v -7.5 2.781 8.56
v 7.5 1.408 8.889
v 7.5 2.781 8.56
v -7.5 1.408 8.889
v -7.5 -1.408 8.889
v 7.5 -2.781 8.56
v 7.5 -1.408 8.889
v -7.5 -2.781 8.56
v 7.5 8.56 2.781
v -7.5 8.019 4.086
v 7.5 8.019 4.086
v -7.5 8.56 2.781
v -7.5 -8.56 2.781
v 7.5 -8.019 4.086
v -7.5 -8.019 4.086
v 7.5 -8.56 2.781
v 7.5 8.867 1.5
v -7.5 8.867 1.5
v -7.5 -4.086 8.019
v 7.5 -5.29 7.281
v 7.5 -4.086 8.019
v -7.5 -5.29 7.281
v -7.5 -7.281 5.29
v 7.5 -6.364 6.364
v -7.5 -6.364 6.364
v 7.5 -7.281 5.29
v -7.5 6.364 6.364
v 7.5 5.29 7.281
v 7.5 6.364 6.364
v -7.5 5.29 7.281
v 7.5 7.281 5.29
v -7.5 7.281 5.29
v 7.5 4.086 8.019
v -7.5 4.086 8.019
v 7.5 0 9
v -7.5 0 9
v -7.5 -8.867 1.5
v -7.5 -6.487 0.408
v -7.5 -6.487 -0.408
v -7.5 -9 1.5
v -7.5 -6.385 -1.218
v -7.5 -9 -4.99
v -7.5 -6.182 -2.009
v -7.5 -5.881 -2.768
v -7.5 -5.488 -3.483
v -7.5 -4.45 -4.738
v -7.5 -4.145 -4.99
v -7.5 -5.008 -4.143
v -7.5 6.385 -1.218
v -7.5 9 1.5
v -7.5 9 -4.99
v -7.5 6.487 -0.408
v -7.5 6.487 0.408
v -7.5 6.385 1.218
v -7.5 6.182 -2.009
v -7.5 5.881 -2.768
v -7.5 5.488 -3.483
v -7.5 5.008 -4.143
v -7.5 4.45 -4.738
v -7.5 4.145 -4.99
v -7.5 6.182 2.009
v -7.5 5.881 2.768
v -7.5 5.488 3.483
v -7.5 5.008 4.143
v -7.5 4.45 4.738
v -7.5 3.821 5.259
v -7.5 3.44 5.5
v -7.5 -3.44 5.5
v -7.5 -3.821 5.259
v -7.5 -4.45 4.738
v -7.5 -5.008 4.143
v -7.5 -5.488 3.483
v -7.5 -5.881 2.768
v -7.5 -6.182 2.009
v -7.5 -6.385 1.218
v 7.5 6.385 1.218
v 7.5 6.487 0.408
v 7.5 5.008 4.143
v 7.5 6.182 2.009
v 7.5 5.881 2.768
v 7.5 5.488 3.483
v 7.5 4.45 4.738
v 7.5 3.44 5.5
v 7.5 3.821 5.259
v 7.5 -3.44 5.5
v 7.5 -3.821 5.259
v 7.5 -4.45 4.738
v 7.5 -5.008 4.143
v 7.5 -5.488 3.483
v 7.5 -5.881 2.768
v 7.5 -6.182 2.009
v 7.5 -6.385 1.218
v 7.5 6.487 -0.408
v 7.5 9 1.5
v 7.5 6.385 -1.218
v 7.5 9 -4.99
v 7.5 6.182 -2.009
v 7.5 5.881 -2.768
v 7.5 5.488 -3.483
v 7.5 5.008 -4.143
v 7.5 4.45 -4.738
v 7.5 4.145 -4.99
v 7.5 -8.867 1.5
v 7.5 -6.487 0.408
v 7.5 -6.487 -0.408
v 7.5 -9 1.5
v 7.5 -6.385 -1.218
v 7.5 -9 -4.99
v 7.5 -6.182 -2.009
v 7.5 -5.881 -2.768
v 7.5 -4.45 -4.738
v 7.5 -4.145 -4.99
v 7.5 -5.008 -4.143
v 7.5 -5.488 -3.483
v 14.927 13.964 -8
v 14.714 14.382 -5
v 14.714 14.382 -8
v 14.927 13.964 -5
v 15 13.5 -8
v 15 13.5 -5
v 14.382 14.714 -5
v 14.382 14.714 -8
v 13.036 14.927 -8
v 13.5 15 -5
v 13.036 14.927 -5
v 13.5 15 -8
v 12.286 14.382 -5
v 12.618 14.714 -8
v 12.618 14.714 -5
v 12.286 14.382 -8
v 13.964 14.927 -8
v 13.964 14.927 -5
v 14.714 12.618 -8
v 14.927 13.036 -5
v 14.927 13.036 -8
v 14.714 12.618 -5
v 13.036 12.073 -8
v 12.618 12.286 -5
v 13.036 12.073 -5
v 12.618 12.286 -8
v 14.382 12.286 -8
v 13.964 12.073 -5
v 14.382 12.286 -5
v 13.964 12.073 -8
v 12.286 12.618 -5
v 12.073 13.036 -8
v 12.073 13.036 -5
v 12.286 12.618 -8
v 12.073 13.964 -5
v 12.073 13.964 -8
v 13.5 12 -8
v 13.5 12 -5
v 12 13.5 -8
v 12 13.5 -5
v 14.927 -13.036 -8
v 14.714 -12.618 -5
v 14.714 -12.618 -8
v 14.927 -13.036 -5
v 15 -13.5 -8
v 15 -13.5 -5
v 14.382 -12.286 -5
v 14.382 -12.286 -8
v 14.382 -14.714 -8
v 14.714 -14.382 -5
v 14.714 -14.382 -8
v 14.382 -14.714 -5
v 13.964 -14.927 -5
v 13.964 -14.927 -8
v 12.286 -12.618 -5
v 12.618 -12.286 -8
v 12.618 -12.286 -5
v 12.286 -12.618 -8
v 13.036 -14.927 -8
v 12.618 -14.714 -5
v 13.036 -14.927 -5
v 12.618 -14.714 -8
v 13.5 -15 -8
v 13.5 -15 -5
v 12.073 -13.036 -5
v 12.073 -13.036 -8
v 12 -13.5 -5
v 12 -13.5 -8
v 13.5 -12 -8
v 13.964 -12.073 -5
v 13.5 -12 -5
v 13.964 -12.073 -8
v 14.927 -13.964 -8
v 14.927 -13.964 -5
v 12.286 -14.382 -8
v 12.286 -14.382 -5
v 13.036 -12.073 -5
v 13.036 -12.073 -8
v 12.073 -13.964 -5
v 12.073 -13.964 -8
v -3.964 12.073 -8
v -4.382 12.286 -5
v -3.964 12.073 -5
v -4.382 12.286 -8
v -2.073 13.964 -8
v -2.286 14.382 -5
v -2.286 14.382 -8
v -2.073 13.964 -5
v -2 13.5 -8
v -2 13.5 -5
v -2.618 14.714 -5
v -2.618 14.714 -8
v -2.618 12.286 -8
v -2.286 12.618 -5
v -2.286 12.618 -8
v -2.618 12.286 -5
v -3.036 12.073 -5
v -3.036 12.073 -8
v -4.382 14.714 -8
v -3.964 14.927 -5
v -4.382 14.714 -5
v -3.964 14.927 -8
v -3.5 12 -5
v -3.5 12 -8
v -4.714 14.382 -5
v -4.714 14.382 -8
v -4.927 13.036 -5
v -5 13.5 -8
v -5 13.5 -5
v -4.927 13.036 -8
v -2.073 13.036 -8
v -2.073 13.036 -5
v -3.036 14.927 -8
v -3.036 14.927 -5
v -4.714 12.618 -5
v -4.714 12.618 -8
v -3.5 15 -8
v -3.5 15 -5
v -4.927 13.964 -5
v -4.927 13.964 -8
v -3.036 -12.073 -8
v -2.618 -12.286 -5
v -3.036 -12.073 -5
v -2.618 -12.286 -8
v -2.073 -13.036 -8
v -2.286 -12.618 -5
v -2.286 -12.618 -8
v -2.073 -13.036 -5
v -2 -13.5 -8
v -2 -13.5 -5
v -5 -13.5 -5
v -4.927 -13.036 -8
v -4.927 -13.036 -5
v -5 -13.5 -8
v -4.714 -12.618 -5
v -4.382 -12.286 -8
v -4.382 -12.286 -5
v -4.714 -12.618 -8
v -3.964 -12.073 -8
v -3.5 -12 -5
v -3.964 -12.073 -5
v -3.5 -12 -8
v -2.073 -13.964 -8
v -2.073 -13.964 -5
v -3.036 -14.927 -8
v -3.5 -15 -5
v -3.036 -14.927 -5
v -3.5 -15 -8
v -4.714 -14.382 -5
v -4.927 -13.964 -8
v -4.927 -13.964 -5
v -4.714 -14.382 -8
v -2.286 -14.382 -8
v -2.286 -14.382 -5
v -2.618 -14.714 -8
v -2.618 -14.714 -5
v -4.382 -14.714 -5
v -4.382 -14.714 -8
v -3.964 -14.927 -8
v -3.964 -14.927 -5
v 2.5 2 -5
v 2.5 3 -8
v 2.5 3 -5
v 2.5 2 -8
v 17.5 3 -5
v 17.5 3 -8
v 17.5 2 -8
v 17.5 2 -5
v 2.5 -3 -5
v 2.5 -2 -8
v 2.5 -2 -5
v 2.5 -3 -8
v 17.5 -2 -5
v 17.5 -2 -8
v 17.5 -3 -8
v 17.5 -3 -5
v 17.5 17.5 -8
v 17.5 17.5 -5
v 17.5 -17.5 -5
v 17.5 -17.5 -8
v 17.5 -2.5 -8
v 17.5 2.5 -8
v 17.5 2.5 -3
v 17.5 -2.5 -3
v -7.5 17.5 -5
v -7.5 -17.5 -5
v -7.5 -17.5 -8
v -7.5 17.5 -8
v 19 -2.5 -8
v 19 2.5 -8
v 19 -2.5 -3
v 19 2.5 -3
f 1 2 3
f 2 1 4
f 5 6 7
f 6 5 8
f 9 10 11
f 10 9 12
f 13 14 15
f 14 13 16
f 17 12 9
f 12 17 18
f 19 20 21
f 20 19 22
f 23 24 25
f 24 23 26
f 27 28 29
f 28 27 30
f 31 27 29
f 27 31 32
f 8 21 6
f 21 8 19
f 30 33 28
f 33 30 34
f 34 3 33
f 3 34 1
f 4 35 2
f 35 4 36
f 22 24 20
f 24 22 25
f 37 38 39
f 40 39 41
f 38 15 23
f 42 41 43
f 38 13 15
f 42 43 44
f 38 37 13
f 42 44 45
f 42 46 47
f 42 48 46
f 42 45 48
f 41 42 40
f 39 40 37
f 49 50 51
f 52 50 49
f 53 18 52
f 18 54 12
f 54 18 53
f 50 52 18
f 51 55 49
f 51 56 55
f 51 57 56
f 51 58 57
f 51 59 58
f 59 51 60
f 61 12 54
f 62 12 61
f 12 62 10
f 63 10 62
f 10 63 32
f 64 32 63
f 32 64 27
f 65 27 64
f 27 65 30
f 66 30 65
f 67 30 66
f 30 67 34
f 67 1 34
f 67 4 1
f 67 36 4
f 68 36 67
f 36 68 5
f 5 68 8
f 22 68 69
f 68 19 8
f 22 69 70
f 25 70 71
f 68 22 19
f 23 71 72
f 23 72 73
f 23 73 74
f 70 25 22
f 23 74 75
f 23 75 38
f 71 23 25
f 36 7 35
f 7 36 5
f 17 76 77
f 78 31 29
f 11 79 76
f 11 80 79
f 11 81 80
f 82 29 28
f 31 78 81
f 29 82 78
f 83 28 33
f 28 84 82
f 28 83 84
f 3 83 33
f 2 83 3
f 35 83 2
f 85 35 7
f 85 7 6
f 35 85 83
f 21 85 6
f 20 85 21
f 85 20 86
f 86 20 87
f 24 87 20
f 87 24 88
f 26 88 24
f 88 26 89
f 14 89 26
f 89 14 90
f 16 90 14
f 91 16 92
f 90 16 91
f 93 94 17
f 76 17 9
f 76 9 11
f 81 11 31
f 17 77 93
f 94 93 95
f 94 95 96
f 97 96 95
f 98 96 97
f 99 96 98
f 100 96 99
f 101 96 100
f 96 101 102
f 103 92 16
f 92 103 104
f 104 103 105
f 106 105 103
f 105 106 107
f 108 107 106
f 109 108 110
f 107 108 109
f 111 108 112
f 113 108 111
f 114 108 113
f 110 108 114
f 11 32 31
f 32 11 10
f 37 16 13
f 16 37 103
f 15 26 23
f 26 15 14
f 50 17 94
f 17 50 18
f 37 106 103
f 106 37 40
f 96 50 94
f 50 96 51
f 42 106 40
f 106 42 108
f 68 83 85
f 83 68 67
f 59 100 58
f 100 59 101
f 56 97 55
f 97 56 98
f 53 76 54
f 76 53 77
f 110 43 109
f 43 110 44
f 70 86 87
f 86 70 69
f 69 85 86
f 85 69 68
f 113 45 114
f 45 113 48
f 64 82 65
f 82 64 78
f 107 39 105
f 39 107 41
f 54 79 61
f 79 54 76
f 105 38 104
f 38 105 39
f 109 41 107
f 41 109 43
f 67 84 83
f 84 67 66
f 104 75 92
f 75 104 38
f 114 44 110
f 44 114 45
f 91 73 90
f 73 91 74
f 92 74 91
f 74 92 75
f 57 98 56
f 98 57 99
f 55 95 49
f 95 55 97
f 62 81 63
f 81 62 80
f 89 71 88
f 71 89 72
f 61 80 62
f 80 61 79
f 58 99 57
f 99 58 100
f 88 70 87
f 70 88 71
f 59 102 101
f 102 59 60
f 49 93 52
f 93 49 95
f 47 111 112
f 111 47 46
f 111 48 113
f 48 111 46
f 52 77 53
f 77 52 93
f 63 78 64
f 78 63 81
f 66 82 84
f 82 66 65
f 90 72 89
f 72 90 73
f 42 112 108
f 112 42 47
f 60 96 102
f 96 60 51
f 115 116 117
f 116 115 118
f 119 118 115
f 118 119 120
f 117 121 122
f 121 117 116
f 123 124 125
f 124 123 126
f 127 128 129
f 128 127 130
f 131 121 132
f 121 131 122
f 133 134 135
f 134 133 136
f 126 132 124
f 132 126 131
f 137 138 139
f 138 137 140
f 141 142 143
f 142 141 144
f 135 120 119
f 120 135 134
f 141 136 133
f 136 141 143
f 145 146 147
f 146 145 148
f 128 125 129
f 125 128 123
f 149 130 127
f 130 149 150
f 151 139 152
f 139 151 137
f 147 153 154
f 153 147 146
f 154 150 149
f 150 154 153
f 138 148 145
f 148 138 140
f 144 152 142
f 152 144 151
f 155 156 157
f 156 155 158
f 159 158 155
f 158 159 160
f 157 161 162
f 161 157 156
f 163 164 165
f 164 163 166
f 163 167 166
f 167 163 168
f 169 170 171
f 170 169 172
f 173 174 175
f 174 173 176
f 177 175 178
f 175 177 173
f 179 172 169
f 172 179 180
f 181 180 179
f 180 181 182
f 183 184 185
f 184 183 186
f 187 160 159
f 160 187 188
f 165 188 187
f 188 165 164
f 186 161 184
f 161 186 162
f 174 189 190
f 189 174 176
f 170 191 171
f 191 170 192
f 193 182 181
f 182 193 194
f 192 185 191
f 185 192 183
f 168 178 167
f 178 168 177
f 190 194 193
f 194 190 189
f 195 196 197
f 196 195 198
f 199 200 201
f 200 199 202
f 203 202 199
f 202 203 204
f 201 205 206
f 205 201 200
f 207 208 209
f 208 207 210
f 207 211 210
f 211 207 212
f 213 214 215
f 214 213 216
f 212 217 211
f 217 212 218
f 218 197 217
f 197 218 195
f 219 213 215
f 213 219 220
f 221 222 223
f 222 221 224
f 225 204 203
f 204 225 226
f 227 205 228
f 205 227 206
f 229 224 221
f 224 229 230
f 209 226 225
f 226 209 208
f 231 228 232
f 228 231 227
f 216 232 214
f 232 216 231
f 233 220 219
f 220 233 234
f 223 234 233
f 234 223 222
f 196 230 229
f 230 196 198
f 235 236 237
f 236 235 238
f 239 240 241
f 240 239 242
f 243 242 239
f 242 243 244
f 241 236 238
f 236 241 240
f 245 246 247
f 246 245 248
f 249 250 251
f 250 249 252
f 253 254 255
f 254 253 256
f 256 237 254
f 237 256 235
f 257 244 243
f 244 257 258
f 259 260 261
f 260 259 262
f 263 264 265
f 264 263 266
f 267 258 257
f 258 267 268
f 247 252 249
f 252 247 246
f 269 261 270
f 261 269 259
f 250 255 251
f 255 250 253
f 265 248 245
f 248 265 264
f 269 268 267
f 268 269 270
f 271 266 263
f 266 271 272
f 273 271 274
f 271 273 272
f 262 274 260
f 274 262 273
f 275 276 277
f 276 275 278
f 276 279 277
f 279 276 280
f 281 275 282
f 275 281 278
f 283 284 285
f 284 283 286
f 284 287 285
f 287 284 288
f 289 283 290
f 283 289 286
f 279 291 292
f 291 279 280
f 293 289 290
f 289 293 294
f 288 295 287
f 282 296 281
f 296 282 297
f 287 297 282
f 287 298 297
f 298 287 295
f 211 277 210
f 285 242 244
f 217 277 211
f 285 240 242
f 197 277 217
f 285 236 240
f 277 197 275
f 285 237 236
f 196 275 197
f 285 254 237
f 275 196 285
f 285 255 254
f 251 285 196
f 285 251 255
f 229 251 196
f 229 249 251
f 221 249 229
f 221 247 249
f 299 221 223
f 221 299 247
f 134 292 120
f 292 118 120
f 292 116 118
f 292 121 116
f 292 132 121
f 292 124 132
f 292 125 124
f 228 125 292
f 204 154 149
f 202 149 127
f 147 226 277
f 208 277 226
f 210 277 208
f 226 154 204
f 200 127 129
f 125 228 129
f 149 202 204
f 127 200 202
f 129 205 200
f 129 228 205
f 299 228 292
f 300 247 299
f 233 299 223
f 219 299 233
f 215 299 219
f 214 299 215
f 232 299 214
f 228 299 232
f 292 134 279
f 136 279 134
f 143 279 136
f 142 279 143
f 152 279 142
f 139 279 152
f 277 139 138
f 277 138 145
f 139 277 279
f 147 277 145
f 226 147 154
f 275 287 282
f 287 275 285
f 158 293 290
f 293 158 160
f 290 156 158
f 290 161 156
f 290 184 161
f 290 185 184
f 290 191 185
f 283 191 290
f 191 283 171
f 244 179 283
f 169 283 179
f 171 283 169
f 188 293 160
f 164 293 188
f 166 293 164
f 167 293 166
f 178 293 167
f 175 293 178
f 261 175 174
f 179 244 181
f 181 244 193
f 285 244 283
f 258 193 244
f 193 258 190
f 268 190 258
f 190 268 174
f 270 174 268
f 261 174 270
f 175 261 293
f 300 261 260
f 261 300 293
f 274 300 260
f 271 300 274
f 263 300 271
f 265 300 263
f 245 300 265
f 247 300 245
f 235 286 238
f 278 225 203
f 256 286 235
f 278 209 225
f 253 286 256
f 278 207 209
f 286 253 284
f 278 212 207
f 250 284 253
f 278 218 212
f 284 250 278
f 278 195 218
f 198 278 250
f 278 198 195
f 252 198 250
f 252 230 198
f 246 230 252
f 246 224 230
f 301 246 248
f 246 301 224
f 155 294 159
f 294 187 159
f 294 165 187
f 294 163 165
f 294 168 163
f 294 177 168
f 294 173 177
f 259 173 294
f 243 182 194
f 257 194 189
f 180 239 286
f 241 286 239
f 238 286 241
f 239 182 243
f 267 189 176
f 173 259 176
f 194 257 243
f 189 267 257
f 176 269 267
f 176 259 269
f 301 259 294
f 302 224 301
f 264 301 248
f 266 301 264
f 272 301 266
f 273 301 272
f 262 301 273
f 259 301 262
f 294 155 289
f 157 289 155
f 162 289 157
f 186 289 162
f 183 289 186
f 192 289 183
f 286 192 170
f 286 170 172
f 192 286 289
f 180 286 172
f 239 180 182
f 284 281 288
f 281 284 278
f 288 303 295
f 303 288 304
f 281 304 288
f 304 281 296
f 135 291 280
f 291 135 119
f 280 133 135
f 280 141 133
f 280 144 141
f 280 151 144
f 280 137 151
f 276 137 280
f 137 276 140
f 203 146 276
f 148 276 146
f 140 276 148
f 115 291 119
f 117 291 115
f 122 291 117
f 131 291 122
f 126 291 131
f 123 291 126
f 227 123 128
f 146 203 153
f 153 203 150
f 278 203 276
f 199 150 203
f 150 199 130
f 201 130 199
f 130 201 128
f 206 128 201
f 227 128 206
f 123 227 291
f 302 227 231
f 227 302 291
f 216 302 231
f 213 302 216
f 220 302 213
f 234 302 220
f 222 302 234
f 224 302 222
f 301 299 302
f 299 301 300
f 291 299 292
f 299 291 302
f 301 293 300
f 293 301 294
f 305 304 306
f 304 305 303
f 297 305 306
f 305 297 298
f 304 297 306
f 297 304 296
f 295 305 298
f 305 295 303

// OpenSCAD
//===============================
//
//  No-tools micro motor mounts
//
//  Designed by Andrew Moore, May 2016
//      http://www.thingiverse.com/TacPar
//
//      For questions, suggestions, or whatever, 
//      please PM me through thingiverse.
//
//      This work is licensed under a Creative Commons 
//      Attribution-ShareAlike 4.0 International License.
//      http://creativecommons.org/licenses/by-sa/4.0/
//
//  This can be used with a variety of 12mm micro gear motors
//  Length dimensions may need to change to accomodate 
//  different gear ratios (particularly the Pololu 
//  1000:1 motors)
//
//  This design allows for a little slop in motor 
//  position.  You can always tighten that up with 
//  some shim stock after you insert the motor.
//
//  The mounting holes are arbitrarily set based on the plate dimensions
//  This could be improved.
//
//  If you use an encoder, you may have to solder it to the back of the 
//  motor after inserting the motor into the holder.
//===============================

//this is motor length without the gearbox
motor_length = 15;
//dimension for rounded sides on micro motor
motor_width = 12; 	
//flat sides on micro motor
motor_height = 10;
//length of the gear box not including the output shaft
gearbox_length = 10;

//wall thickness for the motor holder before tolerance losses
housing_thickness = 3;

//this defines how oversized the hole is for the motor
//this will reduce the effective housing thickness above
tolerance = 0.5;

plate_thickness = 3;
plate_width = 35;
plate_length = motor_length+gearbox_length;
tab_height = plate_thickness+2;
tab_width = 5;
tab_thickness = 1.5;

module MicroGearMotorMount()
{
	//backplate()
	difference()
	{
		positives();
		negatives();
	}
	//add ons in areas that were erased...
	
	//back plate
	translate([plate_length/2-motor_length/2,0,-(motor_height/2+plate_thickness/2)]) backplate();
	//gearbox tab ... stops motor from sliding forward
	translate([-motor_length/2+plate_length+tab_thickness/2,0,-motor_height+tab_height-.5]) cube([tab_thickness,tab_width,tab_height], center=true);

	module positives()
	{
		//motor holding ring
		rotate([0,90,0]) 
            translate([0,0,0]) 
            cylinder(r=motor_width/2+housing_thickness, h=motor_length, center=true, $fn=40);

		translate([0,0,-motor_height/2+plate_thickness]) 
            cube([motor_length,motor_width+2*housing_thickness,motor_height-plate_thickness], center=true);
	}

	module negatives()
	{
		//cut off cylinder below the mounting plate
		translate([0,0,-(motor_height/2+plate_thickness-0.01)]) 
            cube([100,100,2*plate_thickness], center=true);

		//keyed shaft
		rotate([0,90,0]) 
        translate([0,0,-motor_length/2-0.1]) keyshaft(); 
        //translate([0,0,-motor_height/4]) cube([motor_length+.1,motor_width+1,motor_height/2], center=true);
		
	}
    module keyshaft()
    {
        difference()
		{
			positives();
            negatives();
            
			
		}
        module positives()
        {
            cylinder(r=motor_width/2+tolerance, h=motor_length+1, $fn=50);
        }
        
        module negatives()
        {
            translate([-motor_height-tolerance,0,motor_length/2+tolerance]) cube([motor_height,motor_width,motor_length+2],center=true);
            translate([motor_height+tolerance,0,motor_length/2+tolerance]) cube([motor_height,motor_width,motor_length+2],center=true);
        }
    }
	module backplate()
	{
		difference()
		{
			positives();
			negatives();
		}
        
        module positives()
        {
            cube([plate_length,plate_width,plate_thickness],center=true);
        }
        module negatives()
        {
            mount_holes();
			tab_slots();
        }
        
		module mount_holes()
		{
			rotate([0,0,0]) 
                translate([plate_length/2-4,plate_width/2-4,0]) 
                cylinder(r=1.5, h=plate_thickness+1, $fn=20, center=true);
			rotate([0,0,0])
                translate([plate_length/2-4,-(plate_width/2-4),0]) 
                cylinder(r=1.5, h=plate_thickness+1, $fn=20, center=true);
			rotate([0,0,0])
                translate([-(plate_length/2-4),plate_width/2-4,0]) 
                cylinder(r=1.5, h=plate_thickness+1, $fn=20, center=true);
			rotate([0,0,0])
                translate([-(plate_length/2-4),-(plate_width/2-4),0]) 
                cylinder(r=1.5, h=plate_thickness+1, $fn=20, center=true);
			
		}
		module tab_slots()
		{
			translate([0.4*plate_length,tab_width/2, 0]) cube([plate_length,1,plate_thickness+1], center=true);
			translate([0.4*plate_length,-tab_width/2, 0]) cube([plate_length,1,plate_thickness+1], center=true);
		}
	}

	
}

MicroGearMotorMount();
